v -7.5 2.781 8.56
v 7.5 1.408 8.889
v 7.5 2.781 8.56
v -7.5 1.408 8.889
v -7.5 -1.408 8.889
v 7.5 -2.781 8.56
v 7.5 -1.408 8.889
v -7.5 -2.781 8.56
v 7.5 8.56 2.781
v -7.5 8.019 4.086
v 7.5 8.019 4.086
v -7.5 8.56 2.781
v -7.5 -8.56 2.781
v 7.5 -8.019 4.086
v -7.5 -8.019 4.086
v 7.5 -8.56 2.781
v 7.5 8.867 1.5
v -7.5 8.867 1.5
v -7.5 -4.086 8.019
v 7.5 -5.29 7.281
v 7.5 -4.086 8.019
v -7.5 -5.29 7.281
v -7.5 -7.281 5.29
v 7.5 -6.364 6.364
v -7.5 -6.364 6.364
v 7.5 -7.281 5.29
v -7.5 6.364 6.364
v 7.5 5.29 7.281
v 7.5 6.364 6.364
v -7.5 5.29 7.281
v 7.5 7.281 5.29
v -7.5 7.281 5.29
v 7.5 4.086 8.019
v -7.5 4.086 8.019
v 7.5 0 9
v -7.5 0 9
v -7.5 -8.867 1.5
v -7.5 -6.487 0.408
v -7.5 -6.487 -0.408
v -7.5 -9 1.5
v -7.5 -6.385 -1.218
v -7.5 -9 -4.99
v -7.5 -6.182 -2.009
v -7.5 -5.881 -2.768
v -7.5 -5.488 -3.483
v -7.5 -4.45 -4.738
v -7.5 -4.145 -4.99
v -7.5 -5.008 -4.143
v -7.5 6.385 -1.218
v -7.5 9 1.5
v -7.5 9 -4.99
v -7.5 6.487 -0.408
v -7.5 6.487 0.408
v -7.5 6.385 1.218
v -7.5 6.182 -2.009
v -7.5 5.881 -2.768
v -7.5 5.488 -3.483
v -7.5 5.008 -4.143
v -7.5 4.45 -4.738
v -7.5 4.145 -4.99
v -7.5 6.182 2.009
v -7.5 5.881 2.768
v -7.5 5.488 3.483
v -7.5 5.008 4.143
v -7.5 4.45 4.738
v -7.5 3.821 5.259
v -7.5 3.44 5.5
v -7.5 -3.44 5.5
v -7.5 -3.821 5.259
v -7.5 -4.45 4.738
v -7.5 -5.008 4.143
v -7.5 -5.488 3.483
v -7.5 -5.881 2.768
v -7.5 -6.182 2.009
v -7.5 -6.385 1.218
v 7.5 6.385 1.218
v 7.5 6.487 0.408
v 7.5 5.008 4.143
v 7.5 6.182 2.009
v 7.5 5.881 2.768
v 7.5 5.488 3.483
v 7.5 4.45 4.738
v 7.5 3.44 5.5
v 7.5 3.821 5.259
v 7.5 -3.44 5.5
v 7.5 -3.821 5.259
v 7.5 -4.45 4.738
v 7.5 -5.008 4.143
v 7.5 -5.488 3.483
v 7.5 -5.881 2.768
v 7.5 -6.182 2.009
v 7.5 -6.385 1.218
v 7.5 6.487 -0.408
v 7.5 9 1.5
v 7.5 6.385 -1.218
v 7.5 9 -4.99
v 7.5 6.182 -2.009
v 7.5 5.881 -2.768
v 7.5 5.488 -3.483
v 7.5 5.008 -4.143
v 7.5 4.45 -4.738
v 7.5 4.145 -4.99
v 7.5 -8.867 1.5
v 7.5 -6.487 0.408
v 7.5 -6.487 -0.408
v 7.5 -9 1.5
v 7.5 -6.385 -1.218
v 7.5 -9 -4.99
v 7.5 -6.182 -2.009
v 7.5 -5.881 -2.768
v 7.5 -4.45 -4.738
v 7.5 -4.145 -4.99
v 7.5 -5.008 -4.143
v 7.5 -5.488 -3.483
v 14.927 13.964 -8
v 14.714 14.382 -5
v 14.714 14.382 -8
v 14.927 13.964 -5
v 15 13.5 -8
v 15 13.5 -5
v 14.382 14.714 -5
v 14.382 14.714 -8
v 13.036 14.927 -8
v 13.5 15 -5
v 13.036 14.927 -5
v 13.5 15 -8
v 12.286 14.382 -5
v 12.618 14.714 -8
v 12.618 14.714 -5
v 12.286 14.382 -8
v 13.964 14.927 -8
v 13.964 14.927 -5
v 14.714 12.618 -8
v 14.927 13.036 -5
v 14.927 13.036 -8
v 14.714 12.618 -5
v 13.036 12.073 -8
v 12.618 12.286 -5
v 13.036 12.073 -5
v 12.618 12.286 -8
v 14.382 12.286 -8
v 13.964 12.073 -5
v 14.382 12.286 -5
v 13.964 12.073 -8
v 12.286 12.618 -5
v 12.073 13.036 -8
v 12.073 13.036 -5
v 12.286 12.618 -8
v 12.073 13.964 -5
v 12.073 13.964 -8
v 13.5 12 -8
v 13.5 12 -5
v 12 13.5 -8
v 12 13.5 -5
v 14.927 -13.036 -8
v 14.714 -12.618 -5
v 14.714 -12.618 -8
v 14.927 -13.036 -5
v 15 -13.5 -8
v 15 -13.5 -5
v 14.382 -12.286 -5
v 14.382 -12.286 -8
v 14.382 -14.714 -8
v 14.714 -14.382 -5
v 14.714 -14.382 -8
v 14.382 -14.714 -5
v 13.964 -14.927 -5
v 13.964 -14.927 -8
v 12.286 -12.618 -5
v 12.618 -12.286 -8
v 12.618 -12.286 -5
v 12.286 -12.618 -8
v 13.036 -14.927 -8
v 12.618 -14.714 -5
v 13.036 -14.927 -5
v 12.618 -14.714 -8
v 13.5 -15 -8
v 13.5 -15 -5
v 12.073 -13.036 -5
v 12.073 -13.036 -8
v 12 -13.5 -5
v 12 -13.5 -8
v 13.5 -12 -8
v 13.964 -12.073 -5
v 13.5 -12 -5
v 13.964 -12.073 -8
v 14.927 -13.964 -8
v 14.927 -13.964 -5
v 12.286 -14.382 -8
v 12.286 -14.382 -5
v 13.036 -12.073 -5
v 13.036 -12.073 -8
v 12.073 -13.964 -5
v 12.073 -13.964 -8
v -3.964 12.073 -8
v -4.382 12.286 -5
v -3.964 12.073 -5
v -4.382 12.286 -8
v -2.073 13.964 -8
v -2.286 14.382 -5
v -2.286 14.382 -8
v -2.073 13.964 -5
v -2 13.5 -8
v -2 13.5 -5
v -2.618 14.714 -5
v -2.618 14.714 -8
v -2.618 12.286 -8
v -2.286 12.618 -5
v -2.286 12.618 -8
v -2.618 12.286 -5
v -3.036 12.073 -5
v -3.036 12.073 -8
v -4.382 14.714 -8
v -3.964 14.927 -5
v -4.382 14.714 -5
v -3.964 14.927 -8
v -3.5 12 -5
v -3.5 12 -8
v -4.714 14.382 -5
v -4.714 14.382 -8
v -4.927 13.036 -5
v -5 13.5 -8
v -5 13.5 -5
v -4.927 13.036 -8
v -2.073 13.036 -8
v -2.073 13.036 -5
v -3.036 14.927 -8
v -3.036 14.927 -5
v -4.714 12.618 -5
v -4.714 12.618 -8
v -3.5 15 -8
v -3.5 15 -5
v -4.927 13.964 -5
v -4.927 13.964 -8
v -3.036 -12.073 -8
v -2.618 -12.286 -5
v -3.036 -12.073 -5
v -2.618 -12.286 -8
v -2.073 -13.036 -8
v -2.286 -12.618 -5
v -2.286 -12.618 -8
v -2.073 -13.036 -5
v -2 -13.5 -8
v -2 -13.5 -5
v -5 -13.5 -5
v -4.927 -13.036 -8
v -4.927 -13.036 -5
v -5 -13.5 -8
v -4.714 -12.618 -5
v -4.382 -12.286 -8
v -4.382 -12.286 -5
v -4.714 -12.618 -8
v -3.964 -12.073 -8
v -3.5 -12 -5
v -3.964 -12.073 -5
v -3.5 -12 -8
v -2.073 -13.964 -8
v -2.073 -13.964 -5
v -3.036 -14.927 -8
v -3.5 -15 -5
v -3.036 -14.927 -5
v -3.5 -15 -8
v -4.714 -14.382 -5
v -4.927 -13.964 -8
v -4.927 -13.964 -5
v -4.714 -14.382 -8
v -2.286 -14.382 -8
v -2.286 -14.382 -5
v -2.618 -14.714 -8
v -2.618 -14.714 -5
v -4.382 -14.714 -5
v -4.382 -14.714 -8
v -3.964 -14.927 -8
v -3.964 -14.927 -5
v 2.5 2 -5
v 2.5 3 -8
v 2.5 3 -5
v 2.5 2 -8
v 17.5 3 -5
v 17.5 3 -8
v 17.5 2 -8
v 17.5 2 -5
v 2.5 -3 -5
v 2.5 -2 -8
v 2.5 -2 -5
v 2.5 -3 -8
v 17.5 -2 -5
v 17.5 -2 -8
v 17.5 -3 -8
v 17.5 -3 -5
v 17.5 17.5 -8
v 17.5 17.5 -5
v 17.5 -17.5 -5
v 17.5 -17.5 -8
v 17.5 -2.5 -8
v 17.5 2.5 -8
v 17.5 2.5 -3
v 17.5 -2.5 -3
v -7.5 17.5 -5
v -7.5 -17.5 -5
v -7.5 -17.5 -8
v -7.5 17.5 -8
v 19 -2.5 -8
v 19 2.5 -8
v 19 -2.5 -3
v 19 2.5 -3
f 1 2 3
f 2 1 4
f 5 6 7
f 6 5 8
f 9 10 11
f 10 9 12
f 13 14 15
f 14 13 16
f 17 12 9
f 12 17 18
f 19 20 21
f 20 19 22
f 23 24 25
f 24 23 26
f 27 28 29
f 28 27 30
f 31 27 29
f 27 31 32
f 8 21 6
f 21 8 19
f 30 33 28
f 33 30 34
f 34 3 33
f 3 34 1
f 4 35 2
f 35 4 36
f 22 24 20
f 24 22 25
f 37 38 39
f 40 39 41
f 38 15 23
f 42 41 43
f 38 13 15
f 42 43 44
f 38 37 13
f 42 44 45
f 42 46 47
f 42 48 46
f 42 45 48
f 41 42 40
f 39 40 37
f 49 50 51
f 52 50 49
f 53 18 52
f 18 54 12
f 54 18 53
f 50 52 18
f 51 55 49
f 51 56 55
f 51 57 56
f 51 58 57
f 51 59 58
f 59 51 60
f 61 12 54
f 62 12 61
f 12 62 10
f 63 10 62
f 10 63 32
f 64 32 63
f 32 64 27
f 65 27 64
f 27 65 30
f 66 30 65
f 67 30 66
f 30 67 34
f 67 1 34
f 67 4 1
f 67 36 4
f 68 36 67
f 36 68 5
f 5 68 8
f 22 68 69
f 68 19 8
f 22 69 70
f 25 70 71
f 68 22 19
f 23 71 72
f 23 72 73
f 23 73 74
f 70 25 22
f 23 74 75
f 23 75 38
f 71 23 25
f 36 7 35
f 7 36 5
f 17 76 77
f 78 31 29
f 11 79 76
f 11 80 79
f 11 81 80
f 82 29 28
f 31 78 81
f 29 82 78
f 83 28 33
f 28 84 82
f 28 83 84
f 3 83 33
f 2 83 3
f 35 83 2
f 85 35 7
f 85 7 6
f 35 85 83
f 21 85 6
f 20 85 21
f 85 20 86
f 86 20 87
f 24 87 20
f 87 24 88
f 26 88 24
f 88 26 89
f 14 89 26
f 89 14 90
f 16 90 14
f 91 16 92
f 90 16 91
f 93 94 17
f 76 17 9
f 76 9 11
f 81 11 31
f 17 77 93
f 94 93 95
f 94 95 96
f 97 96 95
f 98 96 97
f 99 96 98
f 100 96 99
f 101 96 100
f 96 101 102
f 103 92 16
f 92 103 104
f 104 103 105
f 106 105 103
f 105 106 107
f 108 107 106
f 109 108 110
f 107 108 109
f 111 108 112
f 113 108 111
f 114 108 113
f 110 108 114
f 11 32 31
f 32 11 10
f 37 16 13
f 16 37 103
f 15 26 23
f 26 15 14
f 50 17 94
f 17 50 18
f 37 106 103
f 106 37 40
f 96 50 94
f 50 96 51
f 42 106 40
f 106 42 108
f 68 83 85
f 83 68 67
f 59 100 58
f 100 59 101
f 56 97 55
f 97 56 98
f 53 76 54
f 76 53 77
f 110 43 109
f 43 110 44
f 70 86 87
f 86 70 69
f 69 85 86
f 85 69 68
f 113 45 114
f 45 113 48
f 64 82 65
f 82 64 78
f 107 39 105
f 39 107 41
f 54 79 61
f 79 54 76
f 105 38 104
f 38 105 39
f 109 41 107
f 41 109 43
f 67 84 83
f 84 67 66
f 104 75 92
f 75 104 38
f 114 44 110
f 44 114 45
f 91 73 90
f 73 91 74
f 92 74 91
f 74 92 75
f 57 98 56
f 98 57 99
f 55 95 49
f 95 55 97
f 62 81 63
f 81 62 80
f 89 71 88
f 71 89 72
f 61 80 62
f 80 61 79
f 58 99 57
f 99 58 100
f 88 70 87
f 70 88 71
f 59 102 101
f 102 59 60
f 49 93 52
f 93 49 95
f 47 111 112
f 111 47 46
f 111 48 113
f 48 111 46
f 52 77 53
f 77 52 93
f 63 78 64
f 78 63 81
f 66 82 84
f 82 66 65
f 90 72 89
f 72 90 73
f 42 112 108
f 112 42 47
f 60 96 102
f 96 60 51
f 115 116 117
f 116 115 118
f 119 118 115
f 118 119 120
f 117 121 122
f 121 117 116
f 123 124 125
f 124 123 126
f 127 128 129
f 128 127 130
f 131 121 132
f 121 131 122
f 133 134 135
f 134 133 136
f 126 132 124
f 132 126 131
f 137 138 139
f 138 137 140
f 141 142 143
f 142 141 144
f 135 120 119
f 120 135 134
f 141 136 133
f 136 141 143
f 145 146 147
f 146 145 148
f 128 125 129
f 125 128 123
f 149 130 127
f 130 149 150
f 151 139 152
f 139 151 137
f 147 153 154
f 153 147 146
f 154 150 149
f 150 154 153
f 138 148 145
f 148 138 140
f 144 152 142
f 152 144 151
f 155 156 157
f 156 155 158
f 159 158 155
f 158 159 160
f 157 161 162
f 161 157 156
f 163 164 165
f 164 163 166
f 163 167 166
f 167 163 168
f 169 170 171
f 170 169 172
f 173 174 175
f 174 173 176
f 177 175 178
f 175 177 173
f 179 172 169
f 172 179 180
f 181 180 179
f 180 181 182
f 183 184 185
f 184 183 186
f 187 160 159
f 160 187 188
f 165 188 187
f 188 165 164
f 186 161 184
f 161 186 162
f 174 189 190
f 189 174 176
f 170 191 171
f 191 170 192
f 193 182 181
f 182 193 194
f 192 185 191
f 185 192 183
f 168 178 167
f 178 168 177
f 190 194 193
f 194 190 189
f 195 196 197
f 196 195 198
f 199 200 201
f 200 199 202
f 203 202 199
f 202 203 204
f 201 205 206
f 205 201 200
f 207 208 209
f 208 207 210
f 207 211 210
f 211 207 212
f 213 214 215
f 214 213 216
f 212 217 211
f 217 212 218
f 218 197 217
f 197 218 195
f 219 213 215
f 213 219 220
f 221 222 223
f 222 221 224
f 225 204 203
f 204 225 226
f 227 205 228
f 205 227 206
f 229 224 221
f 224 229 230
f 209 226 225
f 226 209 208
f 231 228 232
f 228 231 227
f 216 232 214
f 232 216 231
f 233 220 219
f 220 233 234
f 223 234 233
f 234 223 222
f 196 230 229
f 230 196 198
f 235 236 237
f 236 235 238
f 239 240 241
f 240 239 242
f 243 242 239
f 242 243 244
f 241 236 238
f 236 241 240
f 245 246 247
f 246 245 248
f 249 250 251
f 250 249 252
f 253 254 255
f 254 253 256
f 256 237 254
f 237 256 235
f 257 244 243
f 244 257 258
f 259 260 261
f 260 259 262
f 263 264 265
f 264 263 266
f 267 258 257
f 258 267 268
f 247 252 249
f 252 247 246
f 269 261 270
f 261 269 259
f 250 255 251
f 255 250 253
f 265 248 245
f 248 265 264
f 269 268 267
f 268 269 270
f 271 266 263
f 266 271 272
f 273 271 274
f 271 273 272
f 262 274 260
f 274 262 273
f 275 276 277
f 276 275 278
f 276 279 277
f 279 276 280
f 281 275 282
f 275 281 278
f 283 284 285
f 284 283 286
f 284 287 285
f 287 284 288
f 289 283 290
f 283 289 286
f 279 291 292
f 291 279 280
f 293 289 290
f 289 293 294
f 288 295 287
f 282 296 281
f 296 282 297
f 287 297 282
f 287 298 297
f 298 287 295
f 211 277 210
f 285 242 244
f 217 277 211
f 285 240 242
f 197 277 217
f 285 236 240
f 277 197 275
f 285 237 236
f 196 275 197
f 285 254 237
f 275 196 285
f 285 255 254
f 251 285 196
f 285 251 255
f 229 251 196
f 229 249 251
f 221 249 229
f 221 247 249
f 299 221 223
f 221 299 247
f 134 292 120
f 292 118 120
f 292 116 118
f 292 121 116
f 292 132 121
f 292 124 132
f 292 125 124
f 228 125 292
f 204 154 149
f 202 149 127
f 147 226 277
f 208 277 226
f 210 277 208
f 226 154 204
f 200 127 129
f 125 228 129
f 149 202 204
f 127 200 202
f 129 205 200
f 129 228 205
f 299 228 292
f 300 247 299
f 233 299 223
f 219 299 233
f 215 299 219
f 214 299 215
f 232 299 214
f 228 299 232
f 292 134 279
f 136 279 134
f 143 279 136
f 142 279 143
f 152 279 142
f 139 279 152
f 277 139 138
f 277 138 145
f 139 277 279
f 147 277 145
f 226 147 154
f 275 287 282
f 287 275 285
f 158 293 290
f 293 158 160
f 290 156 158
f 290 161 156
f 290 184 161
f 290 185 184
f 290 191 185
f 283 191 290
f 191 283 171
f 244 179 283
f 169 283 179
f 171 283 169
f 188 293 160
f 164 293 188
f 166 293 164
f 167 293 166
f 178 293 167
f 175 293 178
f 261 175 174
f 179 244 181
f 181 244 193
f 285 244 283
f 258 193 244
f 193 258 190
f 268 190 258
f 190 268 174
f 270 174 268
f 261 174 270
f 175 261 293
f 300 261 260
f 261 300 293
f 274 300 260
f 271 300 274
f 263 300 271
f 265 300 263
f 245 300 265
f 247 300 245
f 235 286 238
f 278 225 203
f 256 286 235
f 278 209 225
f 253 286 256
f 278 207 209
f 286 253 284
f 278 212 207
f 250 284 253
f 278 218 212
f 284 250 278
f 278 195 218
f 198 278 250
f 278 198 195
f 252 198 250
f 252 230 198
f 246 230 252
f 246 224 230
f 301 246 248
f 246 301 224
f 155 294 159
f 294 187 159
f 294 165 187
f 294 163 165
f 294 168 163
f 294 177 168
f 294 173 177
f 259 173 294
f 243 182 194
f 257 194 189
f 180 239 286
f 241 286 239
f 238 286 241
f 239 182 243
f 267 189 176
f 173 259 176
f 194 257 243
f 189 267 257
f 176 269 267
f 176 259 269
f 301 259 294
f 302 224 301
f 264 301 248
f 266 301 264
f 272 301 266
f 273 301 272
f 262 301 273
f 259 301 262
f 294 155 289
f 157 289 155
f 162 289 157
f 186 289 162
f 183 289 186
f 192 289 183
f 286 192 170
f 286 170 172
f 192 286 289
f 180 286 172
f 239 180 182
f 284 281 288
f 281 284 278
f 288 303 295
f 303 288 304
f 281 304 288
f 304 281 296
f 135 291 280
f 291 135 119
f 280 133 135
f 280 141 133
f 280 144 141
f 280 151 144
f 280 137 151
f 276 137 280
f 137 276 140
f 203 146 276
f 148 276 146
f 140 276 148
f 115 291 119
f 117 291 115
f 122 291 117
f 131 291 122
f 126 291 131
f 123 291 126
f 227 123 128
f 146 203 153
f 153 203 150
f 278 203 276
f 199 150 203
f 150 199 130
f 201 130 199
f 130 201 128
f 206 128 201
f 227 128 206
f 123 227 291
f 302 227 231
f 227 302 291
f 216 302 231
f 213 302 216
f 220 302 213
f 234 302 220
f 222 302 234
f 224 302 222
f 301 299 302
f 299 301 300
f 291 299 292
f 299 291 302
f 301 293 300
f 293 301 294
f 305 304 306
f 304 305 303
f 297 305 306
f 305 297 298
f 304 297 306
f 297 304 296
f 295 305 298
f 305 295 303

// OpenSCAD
//===============================
//
//  No-tools micro motor mounts
//
//  Designed by Andrew Moore, May 2016
//      http://www.thingiverse.com/TacPar
//
//      For questions, suggestions, or whatever, 
//      please PM me through thingiverse.
//
//      This work is licensed under a Creative Commons 
//      Attribution-ShareAlike 4.0 International License.
//      http://creativecommons.org/licenses/by-sa/4.0/
//
//  This can be used with a variety of 12mm micro gear motors
//  Length dimensions may need to change to accomodate 
//  different gear ratios (particularly the Pololu 
//  1000:1 motors)
//
//  This design allows for a little slop in motor 
//  position.  You can always tighten that up with 
//  some shim stock after you insert the motor.
//
//  The mounting holes are arbitrarily set based on the plate dimensions
//  This could be improved.
//
//  If you use an encoder, you may have to solder it to the back of the 
//  motor after inserting the motor into the holder.
//===============================

//this is motor length without the gearbox
motor_length = 15;
//dimension for rounded sides on micro motor
motor_width = 12; 	
//flat sides on micro motor
motor_height = 10;
//length of the gear box not including the output shaft
gearbox_length = 10;

//wall thickness for the motor holder before tolerance losses
housing_thickness = 3;

//this defines how oversized the hole is for the motor
//this will reduce the effective housing thickness above
tolerance = 0.5;

plate_thickness = 3;
plate_width = 35;
plate_length = motor_length+gearbox_length;
tab_height = plate_thickness+2;
tab_width = 5;
tab_thickness = 1.5;

module MicroGearMotorMount()
{
	//backplate()
	difference()
	{
		positives();
		negatives();
	}
	//add ons in areas that were erased...
	
	//back plate
	translate([plate_length/2-motor_length/2,0,-(motor_height/2+plate_thickness/2)]) backplate();
	//gearbox tab ... stops motor from sliding forward
	translate([-motor_length/2+plate_length+tab_thickness/2,0,-motor_height+tab_height-.5]) cube([tab_thickness,tab_width,tab_height], center=true);

	module positives()
	{
		//motor holding ring
		rotate([0,90,0]) 
            translate([0,0,0]) 
            cylinder(r=motor_width/2+housing_thickness, h=motor_length, center=true, $fn=40);

		translate([0,0,-motor_height/2+plate_thickness]) 
            cube([motor_length,motor_width+2*housing_thickness,motor_height-plate_thickness], center=true);
	}

	module negatives()
	{
		//cut off cylinder below the mounting plate
		translate([0,0,-(motor_height/2+plate_thickness-0.01)]) 
            cube([100,100,2*plate_thickness], center=true);

		//keyed shaft
		rotate([0,90,0]) 
        translate([0,0,-motor_length/2-0.1]) keyshaft(); 
        //translate([0,0,-motor_height/4]) cube([motor_length+.1,motor_width+1,motor_height/2], center=true);
		
	}
    module keyshaft()
    {
        difference()
		{
			positives();
            negatives();
            
			
		}
        module positives()
        {
            cylinder(r=motor_width/2+tolerance, h=motor_length+1, $fn=50);
        }
        
        module negatives()
        {
            translate([-motor_height-tolerance,0,motor_length/2+tolerance]) cube([motor_height,motor_width,motor_length+2],center=true);
            translate([motor_height+tolerance,0,motor_length/2+tolerance]) cube([motor_height,motor_width,motor_length+2],center=true);
        }
    }
	module backplate()
	{
		difference()
		{
			positives();
			negatives();
		}
        
        module positives()
        {
            cube([plate_length,plate_width,plate_thickness],center=true);
        }
        module negatives()
        {
            mount_holes();
			tab_slots();
        }
        
		module mount_holes()
		{
			rotate([0,0,0]) 
                translate([plate_length/2-4,plate_width/2-4,0]) 
                cylinder(r=1.5, h=plate_thickness+1, $fn=20, center=true);
			rotate([0,0,0])
                translate([plate_length/2-4,-(plate_width/2-4),0]) 
                cylinder(r=1.5, h=plate_thickness+1, $fn=20, center=true);
			rotate([0,0,0])
                translate([-(plate_length/2-4),plate_width/2-4,0]) 
                cylinder(r=1.5, h=plate_thickness+1, $fn=20, center=true);
			rotate([0,0,0])
                translate([-(plate_length/2-4),-(plate_width/2-4),0]) 
                cylinder(r=1.5, h=plate_thickness+1, $fn=20, center=true);
			
		}
		module tab_slots()
		{
			translate([0.4*plate_length,tab_width/2, 0]) cube([plate_length,1,plate_thickness+1], center=true);
			translate([0.4*plate_length,-tab_width/2, 0]) cube([plate_length,1,plate_thickness+1], center=true);
		}
	}

	
}

MicroGearMotorMount();
